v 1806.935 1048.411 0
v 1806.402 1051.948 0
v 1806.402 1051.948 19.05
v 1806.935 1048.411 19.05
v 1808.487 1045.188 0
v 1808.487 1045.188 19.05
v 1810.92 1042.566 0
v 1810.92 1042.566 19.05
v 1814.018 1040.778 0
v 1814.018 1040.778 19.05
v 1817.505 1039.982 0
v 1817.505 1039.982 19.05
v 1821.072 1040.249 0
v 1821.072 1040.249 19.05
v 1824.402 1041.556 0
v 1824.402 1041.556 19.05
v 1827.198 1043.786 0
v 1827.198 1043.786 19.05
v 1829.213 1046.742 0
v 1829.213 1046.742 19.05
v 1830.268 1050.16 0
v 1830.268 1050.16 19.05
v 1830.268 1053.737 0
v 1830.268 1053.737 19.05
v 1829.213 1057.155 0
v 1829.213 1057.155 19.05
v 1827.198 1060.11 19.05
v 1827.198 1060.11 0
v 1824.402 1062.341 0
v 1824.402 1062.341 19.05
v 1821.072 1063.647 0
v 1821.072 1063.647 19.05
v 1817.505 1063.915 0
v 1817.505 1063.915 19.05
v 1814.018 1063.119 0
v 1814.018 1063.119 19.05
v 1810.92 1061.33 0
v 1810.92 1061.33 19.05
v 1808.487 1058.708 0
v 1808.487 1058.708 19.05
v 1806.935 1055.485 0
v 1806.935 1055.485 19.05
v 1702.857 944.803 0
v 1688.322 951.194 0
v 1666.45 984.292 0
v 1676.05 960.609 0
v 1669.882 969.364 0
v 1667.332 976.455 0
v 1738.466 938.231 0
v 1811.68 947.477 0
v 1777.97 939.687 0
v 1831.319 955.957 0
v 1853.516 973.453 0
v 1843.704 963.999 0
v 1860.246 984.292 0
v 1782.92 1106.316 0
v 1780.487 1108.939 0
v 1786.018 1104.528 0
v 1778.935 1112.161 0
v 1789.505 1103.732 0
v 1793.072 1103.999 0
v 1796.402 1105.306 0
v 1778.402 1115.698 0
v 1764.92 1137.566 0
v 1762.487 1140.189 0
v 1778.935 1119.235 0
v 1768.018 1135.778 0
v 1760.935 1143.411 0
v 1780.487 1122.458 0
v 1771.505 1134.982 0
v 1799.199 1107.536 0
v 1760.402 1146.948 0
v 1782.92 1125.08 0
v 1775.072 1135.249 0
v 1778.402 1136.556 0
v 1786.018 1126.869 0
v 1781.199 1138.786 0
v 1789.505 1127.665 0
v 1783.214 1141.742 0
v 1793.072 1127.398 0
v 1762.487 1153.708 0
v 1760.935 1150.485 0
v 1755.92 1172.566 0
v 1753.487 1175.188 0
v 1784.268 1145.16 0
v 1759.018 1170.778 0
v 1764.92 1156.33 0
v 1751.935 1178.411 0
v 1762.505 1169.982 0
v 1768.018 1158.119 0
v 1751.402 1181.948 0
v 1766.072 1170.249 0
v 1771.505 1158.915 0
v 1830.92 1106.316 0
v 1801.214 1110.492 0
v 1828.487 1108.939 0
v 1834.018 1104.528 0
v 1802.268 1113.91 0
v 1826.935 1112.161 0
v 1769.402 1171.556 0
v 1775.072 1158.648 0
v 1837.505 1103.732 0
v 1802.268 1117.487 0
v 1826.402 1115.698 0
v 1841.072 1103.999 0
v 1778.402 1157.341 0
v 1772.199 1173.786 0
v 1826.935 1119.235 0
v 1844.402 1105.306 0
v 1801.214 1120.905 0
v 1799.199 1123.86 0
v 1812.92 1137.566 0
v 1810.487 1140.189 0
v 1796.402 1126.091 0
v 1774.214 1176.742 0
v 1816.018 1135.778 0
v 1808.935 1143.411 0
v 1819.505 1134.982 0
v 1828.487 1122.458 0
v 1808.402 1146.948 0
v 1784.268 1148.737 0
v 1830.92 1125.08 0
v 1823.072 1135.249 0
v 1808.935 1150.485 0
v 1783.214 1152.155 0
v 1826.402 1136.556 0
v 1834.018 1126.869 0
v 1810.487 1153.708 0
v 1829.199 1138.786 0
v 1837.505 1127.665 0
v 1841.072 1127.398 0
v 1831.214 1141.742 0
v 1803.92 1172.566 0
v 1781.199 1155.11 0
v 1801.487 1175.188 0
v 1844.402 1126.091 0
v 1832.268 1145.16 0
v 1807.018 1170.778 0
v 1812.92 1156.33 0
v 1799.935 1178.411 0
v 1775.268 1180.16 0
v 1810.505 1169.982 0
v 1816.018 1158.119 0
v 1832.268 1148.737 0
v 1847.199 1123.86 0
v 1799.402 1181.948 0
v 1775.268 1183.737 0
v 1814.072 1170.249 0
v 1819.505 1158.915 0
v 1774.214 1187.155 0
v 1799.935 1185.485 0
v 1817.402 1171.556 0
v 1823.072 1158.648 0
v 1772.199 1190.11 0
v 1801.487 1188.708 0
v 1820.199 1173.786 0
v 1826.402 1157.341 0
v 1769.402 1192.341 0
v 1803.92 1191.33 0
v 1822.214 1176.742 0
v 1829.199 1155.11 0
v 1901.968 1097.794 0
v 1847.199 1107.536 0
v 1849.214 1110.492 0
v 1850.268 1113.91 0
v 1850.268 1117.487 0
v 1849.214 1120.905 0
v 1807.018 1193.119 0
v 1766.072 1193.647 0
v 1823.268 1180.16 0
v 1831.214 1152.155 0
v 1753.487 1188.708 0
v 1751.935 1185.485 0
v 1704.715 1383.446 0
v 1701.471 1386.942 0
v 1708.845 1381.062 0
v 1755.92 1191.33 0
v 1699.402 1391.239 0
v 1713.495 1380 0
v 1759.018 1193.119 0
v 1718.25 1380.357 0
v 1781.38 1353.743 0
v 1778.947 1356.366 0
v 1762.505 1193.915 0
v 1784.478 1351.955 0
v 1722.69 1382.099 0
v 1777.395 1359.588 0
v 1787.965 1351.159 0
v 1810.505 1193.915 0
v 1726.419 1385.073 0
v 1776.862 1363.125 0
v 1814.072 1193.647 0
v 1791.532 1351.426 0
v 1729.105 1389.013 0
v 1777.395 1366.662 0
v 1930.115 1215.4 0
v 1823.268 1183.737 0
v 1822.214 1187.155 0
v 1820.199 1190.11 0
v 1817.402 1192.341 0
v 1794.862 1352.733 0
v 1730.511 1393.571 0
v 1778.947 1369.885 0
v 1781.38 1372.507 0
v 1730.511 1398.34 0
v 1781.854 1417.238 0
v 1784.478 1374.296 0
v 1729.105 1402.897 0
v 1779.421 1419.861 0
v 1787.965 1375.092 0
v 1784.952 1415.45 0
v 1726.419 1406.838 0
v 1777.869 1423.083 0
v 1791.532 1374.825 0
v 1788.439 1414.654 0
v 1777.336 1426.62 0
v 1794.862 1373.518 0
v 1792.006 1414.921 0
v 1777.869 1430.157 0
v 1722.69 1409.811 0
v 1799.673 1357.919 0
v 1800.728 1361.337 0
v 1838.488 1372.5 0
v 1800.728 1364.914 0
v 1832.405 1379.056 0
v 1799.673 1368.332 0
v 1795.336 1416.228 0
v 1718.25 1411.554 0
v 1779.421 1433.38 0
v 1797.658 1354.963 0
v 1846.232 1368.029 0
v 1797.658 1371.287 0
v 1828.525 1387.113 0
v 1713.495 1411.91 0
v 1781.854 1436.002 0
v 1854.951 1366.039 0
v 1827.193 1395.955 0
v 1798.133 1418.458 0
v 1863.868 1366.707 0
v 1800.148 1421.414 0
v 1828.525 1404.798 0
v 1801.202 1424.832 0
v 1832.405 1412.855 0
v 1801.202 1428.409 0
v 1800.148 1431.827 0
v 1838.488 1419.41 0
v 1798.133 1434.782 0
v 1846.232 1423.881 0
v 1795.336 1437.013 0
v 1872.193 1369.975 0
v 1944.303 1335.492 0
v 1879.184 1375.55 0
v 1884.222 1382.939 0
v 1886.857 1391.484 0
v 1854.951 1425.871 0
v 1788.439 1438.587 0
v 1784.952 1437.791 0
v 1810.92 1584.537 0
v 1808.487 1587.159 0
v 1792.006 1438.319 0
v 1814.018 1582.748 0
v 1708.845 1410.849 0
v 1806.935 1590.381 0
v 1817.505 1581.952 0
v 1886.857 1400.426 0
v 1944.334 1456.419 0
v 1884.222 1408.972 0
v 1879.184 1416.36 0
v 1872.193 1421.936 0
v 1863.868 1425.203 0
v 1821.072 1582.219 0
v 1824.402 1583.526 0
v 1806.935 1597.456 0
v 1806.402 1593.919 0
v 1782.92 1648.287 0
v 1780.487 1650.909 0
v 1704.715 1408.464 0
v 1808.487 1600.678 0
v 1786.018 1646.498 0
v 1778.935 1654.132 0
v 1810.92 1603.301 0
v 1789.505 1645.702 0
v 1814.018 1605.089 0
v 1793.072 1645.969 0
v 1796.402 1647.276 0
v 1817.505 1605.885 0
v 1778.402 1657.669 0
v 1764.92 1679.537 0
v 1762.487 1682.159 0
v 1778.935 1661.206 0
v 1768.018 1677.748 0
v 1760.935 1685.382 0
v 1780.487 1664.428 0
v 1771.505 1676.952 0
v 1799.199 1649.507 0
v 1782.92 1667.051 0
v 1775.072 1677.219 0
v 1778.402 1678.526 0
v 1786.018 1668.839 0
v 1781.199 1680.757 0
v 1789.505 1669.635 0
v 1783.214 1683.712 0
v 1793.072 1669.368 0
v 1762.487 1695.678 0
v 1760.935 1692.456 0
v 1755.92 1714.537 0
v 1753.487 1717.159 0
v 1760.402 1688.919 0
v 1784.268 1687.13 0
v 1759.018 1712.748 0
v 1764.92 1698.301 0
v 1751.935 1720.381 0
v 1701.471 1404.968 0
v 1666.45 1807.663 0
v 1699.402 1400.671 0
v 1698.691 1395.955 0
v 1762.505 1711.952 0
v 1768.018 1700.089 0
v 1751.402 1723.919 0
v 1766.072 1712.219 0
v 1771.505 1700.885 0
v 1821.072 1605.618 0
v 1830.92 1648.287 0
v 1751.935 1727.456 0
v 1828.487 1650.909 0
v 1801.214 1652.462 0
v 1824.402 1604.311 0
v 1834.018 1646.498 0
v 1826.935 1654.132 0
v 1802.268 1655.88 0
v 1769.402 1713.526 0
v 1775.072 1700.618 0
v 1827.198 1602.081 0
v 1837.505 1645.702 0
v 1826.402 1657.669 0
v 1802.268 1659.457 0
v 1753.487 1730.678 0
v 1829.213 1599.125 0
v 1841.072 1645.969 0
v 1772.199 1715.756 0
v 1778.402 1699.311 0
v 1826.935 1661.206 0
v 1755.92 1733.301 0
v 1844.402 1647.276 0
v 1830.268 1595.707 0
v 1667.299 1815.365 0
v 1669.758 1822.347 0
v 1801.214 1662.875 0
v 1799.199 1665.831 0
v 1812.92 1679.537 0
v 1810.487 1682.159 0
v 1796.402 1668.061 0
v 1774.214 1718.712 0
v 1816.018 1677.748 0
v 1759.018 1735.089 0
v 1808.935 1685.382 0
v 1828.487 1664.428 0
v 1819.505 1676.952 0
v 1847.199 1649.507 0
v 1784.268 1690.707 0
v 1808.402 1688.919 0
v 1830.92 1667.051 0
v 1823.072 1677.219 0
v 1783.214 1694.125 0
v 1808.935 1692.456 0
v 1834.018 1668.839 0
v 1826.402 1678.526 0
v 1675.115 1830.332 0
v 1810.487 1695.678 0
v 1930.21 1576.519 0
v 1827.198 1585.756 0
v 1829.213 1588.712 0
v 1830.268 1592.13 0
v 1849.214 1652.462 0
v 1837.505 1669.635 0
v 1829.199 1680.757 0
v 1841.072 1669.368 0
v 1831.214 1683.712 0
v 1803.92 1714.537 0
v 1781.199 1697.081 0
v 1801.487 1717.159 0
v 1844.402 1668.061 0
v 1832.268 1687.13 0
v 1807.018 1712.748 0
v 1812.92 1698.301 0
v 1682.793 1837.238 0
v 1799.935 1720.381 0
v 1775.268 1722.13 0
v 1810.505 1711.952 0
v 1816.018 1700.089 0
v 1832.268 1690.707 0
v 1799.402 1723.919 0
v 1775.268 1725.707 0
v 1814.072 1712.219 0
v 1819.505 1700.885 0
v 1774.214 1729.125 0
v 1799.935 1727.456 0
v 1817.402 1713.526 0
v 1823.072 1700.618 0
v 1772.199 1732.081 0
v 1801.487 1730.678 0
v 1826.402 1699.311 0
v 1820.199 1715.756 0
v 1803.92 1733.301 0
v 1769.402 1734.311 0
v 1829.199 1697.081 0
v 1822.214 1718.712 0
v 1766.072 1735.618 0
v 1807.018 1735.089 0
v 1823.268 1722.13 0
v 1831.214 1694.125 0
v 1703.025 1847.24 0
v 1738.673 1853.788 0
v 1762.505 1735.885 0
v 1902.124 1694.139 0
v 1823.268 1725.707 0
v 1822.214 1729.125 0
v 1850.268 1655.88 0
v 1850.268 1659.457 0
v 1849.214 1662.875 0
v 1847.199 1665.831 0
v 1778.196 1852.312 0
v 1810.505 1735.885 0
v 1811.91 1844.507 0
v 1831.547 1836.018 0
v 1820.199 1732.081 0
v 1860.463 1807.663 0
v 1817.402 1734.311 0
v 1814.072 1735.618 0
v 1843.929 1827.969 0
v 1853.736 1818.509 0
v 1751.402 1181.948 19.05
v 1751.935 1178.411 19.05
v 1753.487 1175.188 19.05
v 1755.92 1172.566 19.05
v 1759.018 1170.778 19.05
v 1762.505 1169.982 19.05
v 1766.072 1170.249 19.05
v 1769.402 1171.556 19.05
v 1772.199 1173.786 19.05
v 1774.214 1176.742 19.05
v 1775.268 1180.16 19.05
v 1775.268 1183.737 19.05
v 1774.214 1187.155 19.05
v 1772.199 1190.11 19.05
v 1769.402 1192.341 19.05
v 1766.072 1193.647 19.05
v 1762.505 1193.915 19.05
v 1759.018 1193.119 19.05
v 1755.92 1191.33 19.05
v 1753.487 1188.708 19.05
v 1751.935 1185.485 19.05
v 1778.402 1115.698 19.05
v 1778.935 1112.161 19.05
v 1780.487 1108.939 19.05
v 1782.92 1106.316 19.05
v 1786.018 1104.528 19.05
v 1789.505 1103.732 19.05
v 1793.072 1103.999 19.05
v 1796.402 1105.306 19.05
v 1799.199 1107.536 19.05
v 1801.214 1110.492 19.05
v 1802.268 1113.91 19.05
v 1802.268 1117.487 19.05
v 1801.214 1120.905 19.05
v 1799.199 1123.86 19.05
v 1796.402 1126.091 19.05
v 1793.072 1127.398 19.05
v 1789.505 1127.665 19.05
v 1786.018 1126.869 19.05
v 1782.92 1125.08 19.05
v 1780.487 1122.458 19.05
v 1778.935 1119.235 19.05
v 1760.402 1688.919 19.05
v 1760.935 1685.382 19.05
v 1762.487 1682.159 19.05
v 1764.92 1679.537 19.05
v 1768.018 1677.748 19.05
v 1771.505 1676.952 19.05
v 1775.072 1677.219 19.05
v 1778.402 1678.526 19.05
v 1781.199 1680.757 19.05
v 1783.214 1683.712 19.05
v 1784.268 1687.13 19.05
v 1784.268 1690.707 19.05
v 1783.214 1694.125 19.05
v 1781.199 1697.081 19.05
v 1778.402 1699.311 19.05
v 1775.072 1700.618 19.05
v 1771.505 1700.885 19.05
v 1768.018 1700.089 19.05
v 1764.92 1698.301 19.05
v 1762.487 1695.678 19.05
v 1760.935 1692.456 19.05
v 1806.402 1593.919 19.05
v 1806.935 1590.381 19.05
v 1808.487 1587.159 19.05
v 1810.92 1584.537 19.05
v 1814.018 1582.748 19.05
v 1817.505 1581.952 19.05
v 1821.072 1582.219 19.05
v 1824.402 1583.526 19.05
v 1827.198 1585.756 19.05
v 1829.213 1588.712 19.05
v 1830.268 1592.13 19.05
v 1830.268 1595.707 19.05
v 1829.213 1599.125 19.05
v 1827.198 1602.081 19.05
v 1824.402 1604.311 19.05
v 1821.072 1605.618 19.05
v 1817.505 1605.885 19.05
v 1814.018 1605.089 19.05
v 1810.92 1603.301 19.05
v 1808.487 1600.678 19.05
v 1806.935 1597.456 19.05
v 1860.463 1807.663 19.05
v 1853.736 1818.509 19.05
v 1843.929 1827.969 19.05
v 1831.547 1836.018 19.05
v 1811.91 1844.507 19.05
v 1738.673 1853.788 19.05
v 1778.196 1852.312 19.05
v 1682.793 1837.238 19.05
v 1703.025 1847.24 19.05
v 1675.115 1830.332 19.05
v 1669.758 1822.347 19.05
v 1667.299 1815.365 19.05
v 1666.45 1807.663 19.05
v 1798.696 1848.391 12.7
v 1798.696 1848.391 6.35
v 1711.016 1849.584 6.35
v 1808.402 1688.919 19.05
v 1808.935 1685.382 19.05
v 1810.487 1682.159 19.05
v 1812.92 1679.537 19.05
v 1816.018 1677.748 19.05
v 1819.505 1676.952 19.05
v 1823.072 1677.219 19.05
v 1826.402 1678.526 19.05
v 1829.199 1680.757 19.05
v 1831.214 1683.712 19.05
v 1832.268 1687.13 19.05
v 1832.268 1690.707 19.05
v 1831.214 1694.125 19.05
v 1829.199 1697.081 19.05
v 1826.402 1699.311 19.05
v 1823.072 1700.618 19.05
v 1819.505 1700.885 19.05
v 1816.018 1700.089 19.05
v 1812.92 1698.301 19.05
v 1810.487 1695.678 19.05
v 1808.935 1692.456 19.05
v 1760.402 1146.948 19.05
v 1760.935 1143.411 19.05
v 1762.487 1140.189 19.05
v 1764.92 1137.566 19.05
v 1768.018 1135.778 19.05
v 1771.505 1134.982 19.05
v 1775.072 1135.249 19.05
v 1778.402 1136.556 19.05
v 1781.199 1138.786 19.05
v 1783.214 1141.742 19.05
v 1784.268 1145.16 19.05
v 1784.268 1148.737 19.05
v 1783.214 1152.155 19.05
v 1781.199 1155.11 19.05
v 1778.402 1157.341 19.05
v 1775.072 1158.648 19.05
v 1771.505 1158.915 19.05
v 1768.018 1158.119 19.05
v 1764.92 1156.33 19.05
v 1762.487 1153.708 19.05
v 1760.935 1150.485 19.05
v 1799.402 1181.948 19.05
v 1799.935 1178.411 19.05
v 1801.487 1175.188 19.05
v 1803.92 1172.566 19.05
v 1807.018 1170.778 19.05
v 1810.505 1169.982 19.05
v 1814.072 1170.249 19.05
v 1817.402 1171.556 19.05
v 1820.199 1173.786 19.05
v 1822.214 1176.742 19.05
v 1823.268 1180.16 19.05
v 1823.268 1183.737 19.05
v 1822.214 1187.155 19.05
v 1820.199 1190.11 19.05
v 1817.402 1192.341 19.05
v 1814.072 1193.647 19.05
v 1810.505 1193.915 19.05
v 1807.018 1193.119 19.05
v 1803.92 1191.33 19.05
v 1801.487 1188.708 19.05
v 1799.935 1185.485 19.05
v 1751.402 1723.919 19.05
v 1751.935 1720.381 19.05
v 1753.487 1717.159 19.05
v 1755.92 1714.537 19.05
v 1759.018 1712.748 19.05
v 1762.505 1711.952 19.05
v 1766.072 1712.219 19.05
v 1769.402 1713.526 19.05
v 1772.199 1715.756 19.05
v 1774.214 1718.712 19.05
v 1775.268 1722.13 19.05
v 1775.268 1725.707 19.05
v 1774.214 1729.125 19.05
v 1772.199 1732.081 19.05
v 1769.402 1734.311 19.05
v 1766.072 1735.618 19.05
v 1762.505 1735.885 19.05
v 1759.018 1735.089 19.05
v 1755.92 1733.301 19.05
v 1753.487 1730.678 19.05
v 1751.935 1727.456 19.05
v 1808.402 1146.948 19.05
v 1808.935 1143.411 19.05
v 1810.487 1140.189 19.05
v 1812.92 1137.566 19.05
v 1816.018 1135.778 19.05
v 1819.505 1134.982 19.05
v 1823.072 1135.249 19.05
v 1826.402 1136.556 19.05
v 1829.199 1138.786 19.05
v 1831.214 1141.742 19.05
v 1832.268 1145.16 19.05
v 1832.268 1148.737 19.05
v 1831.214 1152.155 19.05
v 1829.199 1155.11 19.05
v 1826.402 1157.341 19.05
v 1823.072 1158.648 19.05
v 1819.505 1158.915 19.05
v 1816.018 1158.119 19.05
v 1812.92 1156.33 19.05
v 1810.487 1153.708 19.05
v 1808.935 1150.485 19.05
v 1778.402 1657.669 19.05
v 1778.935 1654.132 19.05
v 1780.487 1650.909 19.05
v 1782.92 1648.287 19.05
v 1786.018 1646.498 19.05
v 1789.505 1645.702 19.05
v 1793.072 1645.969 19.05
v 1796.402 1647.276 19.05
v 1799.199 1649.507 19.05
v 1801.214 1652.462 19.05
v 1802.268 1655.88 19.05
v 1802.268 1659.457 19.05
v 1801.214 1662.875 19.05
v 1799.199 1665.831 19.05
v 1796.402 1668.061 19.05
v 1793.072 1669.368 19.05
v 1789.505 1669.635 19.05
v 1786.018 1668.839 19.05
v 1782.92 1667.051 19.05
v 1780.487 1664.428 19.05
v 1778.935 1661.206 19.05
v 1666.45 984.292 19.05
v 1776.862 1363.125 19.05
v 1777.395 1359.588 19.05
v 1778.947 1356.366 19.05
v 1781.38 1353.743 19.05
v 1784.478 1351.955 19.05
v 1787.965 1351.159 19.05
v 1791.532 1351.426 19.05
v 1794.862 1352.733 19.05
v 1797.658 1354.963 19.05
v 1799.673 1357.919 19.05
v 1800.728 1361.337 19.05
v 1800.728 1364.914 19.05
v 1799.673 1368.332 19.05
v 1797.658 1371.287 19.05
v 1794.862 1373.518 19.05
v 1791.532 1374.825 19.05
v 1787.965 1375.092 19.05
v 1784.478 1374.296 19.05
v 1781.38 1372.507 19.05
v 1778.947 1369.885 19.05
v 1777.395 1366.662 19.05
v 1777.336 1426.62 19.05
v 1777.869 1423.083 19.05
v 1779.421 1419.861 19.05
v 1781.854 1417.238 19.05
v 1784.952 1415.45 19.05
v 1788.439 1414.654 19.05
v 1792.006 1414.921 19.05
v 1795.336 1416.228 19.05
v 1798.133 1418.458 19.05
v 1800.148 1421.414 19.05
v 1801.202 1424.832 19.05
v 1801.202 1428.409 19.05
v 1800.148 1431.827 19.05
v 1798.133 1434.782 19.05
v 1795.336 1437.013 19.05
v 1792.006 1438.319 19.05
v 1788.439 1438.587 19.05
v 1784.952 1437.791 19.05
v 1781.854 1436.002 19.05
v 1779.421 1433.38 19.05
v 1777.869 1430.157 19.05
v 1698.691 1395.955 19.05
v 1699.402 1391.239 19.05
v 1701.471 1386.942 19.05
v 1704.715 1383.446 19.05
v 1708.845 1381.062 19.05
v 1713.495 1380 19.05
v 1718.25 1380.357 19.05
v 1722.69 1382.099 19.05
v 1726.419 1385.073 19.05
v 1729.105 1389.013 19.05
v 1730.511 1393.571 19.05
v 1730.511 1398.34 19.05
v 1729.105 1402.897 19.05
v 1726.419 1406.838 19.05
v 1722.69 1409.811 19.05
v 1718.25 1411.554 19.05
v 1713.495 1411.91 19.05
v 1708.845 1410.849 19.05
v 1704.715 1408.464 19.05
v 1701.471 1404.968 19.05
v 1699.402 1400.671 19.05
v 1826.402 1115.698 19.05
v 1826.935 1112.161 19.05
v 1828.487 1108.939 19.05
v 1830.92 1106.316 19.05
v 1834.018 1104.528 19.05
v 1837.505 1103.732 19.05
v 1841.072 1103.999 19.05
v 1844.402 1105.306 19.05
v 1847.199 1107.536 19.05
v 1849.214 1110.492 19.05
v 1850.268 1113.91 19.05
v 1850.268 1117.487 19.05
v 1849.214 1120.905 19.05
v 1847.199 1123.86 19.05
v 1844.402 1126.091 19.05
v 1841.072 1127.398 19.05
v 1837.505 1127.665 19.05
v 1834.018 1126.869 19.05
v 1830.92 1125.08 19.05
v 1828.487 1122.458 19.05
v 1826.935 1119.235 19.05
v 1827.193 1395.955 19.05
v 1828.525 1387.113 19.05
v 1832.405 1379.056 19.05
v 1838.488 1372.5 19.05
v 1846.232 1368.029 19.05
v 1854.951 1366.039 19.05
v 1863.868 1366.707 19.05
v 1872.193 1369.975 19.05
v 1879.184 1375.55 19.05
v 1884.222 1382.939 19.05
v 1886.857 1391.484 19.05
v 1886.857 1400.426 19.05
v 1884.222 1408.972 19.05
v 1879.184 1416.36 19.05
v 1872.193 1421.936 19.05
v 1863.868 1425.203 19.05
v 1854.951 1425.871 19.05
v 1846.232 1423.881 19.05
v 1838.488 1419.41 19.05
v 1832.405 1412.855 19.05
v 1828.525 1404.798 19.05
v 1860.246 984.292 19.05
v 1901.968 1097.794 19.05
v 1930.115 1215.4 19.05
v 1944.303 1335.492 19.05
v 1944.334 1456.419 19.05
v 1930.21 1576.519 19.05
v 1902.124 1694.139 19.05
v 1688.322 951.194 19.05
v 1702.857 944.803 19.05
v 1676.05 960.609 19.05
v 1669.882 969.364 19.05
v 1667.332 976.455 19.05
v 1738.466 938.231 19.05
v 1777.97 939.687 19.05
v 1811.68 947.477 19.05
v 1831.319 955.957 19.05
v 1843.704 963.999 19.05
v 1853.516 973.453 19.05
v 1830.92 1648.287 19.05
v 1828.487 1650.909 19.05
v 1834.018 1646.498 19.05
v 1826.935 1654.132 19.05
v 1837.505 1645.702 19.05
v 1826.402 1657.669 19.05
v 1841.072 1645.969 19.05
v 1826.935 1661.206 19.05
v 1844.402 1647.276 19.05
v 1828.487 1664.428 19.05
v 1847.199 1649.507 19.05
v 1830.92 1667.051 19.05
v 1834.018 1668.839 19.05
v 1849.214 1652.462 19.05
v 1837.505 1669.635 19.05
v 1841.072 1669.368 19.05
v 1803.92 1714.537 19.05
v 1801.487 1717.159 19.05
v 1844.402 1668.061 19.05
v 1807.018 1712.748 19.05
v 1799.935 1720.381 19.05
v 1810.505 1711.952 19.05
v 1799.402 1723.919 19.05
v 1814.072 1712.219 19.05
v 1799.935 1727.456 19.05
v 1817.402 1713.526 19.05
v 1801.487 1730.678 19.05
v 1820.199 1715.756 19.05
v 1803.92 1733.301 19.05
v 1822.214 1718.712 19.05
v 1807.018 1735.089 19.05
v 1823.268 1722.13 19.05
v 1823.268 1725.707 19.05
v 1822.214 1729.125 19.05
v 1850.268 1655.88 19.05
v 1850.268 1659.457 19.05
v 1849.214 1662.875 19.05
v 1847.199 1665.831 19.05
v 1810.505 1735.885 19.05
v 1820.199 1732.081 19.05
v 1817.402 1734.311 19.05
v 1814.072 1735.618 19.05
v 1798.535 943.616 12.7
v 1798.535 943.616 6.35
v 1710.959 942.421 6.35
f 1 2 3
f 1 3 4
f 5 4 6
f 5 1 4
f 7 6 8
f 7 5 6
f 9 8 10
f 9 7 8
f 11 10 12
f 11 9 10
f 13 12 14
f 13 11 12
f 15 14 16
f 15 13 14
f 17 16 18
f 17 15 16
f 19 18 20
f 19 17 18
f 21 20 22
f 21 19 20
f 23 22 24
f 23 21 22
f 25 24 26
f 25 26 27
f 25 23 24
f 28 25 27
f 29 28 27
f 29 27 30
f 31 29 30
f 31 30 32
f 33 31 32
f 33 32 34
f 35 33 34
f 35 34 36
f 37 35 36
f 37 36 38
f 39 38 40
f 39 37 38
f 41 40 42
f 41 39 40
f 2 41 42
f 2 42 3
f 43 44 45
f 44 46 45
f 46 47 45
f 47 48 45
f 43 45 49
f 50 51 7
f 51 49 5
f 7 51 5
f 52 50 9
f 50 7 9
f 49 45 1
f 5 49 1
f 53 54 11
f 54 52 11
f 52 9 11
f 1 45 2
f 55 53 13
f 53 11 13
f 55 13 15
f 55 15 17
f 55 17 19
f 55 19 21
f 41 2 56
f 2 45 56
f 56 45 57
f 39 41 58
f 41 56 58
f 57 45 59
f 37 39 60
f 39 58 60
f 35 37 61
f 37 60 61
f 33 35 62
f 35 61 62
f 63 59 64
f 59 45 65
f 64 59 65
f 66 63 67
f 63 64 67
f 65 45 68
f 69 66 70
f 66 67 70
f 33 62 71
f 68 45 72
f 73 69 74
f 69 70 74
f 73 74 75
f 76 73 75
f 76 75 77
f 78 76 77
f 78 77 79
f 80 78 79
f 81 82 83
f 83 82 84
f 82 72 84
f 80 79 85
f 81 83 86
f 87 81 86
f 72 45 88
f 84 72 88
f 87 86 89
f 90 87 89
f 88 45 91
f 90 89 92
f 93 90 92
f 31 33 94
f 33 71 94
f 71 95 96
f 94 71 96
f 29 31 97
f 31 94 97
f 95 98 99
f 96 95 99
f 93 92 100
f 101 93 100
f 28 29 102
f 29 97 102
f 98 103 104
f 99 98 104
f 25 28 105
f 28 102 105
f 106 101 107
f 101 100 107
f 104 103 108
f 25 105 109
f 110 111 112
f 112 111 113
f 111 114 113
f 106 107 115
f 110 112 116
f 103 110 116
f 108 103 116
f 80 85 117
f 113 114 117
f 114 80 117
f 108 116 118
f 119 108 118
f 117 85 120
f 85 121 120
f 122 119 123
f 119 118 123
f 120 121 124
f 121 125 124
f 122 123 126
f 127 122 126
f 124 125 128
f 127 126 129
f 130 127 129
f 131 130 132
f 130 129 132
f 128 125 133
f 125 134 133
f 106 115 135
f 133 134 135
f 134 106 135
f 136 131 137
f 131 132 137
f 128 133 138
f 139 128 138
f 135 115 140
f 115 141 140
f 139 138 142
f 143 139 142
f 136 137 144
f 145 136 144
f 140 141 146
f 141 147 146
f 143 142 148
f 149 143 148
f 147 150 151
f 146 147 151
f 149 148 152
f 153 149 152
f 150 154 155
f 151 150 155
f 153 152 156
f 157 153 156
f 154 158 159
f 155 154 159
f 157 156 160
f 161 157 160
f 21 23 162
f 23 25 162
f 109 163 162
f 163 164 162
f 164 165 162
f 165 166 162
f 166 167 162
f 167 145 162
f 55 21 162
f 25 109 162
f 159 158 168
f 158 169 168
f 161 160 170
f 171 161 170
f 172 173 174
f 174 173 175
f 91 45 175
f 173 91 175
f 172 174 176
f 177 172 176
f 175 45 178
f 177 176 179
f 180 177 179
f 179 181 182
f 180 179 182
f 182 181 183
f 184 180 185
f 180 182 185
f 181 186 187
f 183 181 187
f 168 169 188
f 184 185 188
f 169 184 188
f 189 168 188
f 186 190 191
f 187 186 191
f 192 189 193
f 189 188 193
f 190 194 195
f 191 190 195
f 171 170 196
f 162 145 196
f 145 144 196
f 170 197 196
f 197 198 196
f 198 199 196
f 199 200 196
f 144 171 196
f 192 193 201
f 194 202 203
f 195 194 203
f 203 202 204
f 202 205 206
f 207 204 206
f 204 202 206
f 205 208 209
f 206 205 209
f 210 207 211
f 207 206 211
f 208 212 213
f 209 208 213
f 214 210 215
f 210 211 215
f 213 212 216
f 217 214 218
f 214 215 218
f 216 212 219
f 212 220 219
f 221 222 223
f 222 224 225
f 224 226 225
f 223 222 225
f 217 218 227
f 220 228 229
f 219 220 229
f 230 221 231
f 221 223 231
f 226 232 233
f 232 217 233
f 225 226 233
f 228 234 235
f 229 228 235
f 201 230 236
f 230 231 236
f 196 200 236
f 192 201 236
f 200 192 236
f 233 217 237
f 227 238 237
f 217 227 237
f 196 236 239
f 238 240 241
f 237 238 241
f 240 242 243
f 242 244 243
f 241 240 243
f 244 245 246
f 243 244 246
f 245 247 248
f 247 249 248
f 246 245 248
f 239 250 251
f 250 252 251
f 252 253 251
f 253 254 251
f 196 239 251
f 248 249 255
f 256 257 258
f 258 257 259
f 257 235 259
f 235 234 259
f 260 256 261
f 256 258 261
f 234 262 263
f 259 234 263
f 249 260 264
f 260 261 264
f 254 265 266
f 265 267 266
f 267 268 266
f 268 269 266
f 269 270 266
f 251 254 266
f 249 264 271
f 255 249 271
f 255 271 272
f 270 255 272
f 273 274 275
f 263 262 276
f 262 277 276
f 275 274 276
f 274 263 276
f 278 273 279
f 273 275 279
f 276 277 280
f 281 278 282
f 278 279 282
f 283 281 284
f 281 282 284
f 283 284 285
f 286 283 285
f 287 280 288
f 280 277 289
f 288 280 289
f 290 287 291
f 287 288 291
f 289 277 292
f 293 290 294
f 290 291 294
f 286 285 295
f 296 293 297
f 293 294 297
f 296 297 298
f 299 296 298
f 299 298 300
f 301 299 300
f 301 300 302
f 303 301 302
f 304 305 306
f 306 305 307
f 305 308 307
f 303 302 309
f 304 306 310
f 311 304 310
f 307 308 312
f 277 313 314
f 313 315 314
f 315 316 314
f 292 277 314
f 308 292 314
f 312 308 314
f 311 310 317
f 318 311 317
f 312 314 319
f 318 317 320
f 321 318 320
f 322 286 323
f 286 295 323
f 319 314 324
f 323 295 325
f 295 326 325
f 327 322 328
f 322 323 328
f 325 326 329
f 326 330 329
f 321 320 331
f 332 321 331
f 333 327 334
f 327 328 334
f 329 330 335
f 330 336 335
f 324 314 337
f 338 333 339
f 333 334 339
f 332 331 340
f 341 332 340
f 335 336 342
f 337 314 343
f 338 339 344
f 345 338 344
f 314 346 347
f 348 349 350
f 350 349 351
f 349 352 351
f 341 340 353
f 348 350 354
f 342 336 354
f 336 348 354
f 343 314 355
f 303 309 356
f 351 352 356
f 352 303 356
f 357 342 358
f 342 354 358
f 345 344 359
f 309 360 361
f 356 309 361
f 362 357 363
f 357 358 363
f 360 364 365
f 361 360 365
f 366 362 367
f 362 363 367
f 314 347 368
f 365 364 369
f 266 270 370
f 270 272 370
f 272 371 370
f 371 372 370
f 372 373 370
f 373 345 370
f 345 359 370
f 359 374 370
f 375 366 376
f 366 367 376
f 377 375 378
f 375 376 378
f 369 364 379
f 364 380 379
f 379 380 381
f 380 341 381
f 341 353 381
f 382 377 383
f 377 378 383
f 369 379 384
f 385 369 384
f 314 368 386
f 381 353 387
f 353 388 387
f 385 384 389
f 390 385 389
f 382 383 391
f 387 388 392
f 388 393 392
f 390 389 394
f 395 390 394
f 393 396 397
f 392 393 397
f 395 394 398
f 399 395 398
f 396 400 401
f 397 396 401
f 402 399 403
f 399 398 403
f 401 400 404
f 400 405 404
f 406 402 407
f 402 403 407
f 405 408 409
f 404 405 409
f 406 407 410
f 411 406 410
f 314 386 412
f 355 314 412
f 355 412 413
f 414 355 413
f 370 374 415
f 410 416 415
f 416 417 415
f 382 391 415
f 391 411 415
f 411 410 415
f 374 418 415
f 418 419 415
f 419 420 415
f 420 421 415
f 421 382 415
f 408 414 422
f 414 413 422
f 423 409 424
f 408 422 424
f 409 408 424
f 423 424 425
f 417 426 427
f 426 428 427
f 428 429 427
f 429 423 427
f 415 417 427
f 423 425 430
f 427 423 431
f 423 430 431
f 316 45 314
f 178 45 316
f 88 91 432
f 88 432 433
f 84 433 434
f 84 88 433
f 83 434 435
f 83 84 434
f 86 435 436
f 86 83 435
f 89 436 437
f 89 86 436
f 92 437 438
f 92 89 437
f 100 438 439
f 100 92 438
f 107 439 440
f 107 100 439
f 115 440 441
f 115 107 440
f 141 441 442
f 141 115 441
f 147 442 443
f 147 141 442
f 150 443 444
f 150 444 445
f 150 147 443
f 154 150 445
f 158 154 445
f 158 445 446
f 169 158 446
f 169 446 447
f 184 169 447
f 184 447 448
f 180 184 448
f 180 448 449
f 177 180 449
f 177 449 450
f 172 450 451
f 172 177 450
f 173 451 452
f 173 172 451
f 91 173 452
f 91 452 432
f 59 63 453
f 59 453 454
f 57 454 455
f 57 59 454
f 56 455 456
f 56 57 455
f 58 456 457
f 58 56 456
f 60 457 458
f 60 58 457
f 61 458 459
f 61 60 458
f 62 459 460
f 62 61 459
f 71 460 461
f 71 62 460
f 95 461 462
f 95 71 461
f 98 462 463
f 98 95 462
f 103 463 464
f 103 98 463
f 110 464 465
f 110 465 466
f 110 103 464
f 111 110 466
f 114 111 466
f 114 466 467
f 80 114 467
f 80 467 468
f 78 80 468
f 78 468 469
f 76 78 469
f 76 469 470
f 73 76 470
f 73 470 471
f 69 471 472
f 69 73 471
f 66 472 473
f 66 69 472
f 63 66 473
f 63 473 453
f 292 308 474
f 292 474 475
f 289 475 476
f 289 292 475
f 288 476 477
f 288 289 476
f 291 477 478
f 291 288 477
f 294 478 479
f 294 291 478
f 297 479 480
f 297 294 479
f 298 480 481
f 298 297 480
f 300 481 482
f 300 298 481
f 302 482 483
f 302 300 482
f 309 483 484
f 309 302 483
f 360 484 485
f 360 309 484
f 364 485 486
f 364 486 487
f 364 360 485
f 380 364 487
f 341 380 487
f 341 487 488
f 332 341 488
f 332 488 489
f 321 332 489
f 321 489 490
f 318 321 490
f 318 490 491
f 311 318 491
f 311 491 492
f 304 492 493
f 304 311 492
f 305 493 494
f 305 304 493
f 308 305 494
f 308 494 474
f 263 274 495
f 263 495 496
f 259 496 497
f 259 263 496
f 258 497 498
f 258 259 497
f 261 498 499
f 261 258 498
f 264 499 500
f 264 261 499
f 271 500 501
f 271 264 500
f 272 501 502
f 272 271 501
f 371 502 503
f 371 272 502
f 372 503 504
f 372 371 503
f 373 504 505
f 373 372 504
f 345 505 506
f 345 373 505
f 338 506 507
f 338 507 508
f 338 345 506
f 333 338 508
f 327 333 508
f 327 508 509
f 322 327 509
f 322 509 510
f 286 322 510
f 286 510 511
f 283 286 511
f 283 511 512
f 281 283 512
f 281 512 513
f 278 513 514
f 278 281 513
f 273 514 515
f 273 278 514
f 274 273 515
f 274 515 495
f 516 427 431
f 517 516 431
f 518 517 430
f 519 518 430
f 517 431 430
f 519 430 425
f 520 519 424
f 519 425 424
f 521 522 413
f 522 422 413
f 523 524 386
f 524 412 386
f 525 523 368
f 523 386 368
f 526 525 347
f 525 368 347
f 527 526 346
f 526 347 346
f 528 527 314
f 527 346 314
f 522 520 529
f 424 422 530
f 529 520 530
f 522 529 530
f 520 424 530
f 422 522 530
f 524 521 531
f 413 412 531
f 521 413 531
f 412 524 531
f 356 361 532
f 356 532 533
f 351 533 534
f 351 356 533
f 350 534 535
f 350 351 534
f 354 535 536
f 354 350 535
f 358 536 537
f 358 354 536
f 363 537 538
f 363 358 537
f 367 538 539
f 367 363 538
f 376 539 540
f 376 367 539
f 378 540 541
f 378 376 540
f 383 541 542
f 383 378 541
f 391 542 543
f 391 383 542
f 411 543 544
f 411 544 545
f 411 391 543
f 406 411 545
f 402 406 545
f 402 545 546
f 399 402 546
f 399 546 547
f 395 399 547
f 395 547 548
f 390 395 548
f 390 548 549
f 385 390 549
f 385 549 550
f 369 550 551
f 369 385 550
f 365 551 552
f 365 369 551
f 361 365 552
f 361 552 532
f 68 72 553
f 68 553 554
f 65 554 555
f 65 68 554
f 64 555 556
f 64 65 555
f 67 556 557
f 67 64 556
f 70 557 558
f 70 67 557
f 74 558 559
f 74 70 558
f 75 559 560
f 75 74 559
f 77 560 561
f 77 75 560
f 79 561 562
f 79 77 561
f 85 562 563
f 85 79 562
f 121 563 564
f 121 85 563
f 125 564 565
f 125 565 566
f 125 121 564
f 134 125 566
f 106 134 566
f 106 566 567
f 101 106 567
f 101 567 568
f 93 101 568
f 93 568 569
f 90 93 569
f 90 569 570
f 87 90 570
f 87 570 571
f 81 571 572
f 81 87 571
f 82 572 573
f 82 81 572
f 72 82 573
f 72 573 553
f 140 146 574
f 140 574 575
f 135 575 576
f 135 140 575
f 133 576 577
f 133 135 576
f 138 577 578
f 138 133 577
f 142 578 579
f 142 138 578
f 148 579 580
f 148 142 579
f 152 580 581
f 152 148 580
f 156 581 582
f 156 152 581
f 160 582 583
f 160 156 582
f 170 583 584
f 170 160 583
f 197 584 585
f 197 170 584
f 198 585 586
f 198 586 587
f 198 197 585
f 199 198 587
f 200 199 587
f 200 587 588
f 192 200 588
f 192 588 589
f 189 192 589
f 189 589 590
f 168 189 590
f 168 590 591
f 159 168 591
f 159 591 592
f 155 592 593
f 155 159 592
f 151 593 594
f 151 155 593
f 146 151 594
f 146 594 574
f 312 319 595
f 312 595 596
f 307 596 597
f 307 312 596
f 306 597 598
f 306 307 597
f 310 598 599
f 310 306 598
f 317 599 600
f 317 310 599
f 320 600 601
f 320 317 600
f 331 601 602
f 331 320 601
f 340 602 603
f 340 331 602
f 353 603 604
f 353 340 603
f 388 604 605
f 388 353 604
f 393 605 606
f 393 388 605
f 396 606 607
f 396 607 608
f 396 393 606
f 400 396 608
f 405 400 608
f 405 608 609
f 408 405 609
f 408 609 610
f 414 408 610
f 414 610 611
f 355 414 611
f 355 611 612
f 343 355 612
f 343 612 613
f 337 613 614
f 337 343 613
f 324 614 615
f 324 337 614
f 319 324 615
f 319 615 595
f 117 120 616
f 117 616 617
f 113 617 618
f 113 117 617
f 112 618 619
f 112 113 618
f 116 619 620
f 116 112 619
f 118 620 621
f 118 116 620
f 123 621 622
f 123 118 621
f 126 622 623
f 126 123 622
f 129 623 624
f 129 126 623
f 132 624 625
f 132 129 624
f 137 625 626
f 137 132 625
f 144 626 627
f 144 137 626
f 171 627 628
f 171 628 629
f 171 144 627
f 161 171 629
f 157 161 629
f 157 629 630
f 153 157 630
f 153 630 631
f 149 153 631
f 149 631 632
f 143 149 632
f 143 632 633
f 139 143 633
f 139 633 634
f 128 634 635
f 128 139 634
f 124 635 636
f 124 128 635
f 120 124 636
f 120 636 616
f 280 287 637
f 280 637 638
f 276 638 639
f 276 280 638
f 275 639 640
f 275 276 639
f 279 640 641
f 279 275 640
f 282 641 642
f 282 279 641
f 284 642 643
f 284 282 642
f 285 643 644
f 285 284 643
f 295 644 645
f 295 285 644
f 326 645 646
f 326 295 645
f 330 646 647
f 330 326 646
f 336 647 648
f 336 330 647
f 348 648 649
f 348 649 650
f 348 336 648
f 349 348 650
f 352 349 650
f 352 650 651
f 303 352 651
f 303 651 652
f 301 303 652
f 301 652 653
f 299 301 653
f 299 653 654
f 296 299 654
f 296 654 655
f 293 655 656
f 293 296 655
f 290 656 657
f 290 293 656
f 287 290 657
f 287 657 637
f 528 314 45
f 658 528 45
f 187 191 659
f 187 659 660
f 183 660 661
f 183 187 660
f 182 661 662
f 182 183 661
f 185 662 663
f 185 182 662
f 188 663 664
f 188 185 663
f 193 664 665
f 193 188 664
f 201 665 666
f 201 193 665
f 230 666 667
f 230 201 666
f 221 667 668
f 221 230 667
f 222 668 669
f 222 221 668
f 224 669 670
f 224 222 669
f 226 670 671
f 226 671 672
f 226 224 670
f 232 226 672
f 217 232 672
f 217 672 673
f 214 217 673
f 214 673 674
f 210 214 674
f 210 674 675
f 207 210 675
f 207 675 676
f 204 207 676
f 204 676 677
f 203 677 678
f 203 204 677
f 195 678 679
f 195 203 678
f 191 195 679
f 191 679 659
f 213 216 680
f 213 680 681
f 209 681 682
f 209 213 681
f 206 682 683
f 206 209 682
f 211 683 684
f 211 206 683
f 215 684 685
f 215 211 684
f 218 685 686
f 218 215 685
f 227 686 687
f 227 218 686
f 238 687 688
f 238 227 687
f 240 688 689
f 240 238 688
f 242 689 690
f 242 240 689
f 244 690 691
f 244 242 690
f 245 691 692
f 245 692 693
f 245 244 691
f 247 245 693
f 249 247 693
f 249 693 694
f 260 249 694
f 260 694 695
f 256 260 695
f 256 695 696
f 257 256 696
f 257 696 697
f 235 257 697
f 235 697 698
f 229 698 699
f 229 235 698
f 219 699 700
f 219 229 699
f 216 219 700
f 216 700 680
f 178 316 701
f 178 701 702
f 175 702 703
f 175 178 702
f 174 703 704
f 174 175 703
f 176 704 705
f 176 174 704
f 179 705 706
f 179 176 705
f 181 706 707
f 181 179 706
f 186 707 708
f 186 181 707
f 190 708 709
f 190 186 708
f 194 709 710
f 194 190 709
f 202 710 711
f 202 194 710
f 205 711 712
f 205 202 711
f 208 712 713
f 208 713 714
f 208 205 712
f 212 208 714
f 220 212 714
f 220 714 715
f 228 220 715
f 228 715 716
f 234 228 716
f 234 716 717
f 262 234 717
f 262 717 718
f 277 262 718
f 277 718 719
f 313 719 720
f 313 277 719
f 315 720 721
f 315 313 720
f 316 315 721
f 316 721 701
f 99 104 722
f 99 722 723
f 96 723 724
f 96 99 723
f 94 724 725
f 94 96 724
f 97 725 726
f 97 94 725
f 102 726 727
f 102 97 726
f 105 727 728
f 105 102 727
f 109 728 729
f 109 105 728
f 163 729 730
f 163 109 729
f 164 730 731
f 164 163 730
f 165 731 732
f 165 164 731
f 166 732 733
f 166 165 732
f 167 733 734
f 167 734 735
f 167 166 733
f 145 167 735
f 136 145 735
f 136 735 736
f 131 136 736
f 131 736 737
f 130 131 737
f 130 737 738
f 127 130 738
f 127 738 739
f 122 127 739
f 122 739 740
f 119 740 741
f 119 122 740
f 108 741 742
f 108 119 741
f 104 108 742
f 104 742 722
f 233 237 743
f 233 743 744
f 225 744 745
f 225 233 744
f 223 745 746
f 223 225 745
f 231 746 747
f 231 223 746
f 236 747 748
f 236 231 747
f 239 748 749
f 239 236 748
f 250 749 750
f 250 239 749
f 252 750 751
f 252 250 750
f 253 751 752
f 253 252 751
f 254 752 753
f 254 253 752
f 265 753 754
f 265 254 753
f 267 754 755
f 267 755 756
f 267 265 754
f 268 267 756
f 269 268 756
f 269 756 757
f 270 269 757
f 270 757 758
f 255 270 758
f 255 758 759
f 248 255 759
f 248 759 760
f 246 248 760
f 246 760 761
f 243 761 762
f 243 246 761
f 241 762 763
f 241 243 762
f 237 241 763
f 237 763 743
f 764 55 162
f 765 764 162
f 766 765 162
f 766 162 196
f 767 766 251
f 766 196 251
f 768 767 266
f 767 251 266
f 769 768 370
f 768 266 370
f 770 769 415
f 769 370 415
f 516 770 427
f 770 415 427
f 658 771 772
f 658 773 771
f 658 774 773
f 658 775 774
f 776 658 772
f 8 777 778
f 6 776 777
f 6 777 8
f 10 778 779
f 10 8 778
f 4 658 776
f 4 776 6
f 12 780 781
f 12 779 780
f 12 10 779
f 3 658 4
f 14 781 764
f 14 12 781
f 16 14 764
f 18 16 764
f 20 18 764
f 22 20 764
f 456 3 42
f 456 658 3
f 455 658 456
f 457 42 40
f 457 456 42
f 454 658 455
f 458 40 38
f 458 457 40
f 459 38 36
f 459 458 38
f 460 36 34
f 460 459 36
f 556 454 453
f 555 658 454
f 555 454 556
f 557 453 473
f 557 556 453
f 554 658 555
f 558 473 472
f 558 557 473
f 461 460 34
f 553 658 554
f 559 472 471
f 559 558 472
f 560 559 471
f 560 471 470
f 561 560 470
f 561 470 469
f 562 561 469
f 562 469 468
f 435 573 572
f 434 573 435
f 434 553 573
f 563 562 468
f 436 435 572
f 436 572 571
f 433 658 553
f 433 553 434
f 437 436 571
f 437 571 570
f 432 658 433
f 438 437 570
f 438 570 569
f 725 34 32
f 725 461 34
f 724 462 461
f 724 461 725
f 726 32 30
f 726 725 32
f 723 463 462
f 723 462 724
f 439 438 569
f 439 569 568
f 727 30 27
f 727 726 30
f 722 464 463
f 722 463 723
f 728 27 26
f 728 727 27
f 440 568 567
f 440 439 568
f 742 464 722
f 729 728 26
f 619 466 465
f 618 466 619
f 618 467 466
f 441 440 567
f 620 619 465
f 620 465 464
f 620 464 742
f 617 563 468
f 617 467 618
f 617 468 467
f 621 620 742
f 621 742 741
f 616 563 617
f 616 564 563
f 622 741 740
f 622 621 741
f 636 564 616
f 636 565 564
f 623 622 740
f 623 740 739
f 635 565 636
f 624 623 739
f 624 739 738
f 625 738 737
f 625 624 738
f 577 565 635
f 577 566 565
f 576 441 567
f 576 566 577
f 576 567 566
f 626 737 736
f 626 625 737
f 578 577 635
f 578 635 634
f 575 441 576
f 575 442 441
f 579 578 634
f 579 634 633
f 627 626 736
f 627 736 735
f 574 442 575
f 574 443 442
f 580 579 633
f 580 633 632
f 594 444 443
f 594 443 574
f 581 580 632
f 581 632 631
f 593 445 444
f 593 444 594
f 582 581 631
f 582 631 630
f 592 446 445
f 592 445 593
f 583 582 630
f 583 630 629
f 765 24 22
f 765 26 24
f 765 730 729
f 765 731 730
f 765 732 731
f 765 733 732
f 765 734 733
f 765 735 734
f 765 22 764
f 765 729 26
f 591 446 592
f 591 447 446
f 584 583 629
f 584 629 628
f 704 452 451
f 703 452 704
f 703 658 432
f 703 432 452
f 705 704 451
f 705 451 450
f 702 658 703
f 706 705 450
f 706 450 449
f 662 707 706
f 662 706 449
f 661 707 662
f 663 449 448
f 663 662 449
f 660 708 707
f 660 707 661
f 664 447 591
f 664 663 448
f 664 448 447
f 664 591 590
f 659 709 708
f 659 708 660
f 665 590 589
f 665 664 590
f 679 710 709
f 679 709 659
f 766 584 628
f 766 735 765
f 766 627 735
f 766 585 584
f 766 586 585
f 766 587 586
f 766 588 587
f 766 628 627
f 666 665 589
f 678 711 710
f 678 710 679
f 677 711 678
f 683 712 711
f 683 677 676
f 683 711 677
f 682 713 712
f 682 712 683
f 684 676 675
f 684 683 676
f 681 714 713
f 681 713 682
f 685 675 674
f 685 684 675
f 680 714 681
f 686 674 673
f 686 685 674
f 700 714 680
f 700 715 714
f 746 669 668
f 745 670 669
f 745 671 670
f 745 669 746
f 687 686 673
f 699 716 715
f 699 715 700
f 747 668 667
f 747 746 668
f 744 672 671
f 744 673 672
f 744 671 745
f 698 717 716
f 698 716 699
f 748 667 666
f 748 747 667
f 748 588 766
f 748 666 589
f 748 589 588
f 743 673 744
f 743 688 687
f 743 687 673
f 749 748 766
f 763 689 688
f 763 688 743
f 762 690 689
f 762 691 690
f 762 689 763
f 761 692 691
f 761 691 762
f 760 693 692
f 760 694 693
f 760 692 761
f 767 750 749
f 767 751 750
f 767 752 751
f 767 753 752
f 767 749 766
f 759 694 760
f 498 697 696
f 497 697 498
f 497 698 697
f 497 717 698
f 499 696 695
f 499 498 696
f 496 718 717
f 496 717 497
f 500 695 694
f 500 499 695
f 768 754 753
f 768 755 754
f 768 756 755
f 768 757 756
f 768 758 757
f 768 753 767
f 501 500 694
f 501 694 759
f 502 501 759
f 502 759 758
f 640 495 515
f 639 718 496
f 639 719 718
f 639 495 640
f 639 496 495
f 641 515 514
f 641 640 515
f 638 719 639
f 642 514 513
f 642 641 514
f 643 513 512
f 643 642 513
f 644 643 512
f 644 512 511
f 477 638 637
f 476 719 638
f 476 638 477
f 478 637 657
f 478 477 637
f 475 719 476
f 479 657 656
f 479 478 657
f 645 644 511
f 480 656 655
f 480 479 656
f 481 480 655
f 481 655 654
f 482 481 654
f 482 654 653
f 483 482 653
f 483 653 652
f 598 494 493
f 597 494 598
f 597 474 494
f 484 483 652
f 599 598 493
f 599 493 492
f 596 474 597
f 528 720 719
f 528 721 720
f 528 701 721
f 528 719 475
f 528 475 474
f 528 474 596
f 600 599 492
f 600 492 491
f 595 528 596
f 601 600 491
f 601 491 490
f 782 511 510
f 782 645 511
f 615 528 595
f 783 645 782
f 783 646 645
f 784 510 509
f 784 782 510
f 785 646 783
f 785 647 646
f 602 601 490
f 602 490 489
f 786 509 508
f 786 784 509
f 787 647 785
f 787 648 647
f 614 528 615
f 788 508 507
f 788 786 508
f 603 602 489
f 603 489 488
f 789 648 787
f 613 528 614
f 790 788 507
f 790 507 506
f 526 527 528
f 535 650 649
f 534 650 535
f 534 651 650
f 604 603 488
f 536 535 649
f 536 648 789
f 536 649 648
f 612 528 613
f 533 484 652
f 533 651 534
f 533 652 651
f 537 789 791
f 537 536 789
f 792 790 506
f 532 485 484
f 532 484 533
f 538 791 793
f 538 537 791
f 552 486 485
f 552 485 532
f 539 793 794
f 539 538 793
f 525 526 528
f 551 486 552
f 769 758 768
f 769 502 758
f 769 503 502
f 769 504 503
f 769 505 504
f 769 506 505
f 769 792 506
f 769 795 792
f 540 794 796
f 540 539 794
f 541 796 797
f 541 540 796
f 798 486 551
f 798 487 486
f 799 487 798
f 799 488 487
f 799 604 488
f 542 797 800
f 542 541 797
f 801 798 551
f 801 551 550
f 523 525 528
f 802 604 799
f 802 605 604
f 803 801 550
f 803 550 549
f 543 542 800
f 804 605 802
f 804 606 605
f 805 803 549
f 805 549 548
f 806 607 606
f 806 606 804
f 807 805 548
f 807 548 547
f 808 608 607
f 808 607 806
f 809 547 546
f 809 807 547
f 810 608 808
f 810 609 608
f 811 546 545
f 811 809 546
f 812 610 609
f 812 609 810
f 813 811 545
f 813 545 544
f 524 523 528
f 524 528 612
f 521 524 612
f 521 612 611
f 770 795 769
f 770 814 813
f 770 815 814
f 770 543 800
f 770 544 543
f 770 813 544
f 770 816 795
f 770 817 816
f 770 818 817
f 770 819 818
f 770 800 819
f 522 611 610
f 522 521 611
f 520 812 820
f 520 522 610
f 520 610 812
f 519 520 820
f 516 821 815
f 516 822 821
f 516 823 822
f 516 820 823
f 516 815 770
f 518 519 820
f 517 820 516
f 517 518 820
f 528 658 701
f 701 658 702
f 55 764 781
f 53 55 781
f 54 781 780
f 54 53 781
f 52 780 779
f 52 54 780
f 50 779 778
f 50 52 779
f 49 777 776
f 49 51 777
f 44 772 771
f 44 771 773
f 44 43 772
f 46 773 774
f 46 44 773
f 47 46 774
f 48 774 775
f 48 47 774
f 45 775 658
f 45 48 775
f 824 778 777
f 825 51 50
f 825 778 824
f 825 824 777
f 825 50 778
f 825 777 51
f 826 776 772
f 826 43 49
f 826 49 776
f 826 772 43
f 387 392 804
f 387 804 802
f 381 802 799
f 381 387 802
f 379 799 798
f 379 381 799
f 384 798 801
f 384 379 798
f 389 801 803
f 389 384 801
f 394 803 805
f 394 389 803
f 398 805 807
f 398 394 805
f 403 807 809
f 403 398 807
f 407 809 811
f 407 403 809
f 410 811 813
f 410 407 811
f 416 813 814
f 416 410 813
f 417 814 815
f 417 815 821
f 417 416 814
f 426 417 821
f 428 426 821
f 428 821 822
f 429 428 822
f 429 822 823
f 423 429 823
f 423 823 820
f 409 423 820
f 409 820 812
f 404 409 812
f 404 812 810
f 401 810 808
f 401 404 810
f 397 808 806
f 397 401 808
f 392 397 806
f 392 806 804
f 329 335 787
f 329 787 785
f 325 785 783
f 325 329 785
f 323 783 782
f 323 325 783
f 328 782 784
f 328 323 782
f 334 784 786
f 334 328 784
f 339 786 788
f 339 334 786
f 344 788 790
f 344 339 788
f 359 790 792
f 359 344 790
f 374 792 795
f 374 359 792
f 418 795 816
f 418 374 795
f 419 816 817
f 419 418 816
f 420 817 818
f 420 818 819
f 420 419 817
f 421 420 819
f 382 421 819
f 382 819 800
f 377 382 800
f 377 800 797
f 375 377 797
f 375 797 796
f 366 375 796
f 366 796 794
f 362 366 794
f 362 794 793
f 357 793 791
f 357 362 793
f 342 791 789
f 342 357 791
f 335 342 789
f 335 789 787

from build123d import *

# Parameters (mm, degrees)
SKETCH1_R           = 12.0000014
SKETCH1_R_2         = 29.99994
SKETCH1_R_3         = 15.99946
BOSS_EXTRUDE1_DEPTH = 19.05


with BuildPart() as part:
    # Sketch1 → Boss-Extrude1 (new body)
    with BuildSketch(Plane.XY):
        with BuildLine():
            Line((1666.449914345, 1807.663309633), (1666.449914345, 984.292129537))
            add(Edge.make_bspline(
                [(1860.24643809, 984.292129537), (1834.442562073, 925.070762843), (1666.449914345, 919.693288289), (1666.449914345, 984.292129537)],
                knots=[0, 0, 0, 0, 7.629784399, 7.629784399, 7.629784399, 7.629784399], degree=3))
            ThreePointArc((1860.24643809, 984.292129537), (1946.092561687, 1395.955210336), (1860.46260196, 1807.663309633))
            add(Edge.make_bspline(
                [(1860.46260196, 1807.663309633), (1834.661077492, 1866.964288613), (1666.449914345, 1872.334205504), (1666.449914345, 1807.663309633)],
                knots=[0, 0, 0, 0, 7.638294788, 7.638294788, 7.638294788, 7.638294788], degree=3))
        make_face()
        with Locations(Location((1811.402116463, 1181.948319082, 0), (0, 0, 180))):
            Circle(SKETCH1_R, mode=Mode.SUBTRACT)
        with Locations(Location((1820.402123863, 1146.948389082, 0), (0, 0, 180))):
            Circle(SKETCH1_R, mode=Mode.SUBTRACT)
        with Locations(Location((1838.402113263, 1115.698388082, 0), (0, 0, 180))):
            Circle(SKETCH1_R, mode=Mode.SUBTRACT)
        with Locations(Location((1772.402194463, 1146.948389082, 0), (0, 0, 180))):
            Circle(SKETCH1_R, mode=Mode.SUBTRACT)
        with Locations(Location((1790.402183863, 1115.698388082, 0), (0, 0, 180))):
            Circle(SKETCH1_R, mode=Mode.SUBTRACT)
        with Locations(Location((1763.402187063, 1181.948319082, 0), (0, 0, 180))):
            Circle(SKETCH1_R, mode=Mode.SUBTRACT)
        with Locations(Location((1818.401594463, 1051.948325082, 0), (0, 0, 180))):
            Circle(SKETCH1_R, mode=Mode.SUBTRACT)
        with Locations(Location((1811.402116463, 1723.918527241, 0), (0, 0, 180))):
            Circle(SKETCH1_R, mode=Mode.SUBTRACT)
        with Locations(Location((1820.402123863, 1688.918597241, 0), (0, 0, 180))):
            Circle(SKETCH1_R, mode=Mode.SUBTRACT)
        with Locations(Location((1838.402113263, 1657.668596241, 0), (0, 0, 180))):
            Circle(SKETCH1_R, mode=Mode.SUBTRACT)
        with Locations(Location((1772.402194463, 1688.918597241, 0), (0, 0, 180))):
            Circle(SKETCH1_R, mode=Mode.SUBTRACT)
        with Locations(Location((1790.402183863, 1657.668596241, 0), (0, 0, 180))):
            Circle(SKETCH1_R, mode=Mode.SUBTRACT)
        with Locations(Location((1763.402187063, 1723.918527241, 0), (0, 0, 180))):
            Circle(SKETCH1_R, mode=Mode.SUBTRACT)
        with Locations(Location((1818.401594463, 1593.918533241, 0), (0, 0, 180))):
            Circle(SKETCH1_R, mode=Mode.SUBTRACT)
        with Locations(Location((1788.861738175, 1363.125382024, 0), (0, 0, 180))):
            Circle(SKETCH1_R, mode=Mode.SUBTRACT)
        with Locations(Location((1789.336065957, 1426.620354396, 0), (0, 0, 180))):
            Circle(SKETCH1_R, mode=Mode.SUBTRACT)
        with Locations(Location((1857.192561687, 1395.955210336, 0), (0, 0, 180))):
            Circle(SKETCH1_R_2, mode=Mode.SUBTRACT)
        with Locations(Location((1714.690199276, 1395.955210336, 0), (0, 0, 180))):
            Circle(SKETCH1_R_3, mode=Mode.SUBTRACT)
    extrude(amount=BOSS_EXTRUDE1_DEPTH)


solid = part.part
